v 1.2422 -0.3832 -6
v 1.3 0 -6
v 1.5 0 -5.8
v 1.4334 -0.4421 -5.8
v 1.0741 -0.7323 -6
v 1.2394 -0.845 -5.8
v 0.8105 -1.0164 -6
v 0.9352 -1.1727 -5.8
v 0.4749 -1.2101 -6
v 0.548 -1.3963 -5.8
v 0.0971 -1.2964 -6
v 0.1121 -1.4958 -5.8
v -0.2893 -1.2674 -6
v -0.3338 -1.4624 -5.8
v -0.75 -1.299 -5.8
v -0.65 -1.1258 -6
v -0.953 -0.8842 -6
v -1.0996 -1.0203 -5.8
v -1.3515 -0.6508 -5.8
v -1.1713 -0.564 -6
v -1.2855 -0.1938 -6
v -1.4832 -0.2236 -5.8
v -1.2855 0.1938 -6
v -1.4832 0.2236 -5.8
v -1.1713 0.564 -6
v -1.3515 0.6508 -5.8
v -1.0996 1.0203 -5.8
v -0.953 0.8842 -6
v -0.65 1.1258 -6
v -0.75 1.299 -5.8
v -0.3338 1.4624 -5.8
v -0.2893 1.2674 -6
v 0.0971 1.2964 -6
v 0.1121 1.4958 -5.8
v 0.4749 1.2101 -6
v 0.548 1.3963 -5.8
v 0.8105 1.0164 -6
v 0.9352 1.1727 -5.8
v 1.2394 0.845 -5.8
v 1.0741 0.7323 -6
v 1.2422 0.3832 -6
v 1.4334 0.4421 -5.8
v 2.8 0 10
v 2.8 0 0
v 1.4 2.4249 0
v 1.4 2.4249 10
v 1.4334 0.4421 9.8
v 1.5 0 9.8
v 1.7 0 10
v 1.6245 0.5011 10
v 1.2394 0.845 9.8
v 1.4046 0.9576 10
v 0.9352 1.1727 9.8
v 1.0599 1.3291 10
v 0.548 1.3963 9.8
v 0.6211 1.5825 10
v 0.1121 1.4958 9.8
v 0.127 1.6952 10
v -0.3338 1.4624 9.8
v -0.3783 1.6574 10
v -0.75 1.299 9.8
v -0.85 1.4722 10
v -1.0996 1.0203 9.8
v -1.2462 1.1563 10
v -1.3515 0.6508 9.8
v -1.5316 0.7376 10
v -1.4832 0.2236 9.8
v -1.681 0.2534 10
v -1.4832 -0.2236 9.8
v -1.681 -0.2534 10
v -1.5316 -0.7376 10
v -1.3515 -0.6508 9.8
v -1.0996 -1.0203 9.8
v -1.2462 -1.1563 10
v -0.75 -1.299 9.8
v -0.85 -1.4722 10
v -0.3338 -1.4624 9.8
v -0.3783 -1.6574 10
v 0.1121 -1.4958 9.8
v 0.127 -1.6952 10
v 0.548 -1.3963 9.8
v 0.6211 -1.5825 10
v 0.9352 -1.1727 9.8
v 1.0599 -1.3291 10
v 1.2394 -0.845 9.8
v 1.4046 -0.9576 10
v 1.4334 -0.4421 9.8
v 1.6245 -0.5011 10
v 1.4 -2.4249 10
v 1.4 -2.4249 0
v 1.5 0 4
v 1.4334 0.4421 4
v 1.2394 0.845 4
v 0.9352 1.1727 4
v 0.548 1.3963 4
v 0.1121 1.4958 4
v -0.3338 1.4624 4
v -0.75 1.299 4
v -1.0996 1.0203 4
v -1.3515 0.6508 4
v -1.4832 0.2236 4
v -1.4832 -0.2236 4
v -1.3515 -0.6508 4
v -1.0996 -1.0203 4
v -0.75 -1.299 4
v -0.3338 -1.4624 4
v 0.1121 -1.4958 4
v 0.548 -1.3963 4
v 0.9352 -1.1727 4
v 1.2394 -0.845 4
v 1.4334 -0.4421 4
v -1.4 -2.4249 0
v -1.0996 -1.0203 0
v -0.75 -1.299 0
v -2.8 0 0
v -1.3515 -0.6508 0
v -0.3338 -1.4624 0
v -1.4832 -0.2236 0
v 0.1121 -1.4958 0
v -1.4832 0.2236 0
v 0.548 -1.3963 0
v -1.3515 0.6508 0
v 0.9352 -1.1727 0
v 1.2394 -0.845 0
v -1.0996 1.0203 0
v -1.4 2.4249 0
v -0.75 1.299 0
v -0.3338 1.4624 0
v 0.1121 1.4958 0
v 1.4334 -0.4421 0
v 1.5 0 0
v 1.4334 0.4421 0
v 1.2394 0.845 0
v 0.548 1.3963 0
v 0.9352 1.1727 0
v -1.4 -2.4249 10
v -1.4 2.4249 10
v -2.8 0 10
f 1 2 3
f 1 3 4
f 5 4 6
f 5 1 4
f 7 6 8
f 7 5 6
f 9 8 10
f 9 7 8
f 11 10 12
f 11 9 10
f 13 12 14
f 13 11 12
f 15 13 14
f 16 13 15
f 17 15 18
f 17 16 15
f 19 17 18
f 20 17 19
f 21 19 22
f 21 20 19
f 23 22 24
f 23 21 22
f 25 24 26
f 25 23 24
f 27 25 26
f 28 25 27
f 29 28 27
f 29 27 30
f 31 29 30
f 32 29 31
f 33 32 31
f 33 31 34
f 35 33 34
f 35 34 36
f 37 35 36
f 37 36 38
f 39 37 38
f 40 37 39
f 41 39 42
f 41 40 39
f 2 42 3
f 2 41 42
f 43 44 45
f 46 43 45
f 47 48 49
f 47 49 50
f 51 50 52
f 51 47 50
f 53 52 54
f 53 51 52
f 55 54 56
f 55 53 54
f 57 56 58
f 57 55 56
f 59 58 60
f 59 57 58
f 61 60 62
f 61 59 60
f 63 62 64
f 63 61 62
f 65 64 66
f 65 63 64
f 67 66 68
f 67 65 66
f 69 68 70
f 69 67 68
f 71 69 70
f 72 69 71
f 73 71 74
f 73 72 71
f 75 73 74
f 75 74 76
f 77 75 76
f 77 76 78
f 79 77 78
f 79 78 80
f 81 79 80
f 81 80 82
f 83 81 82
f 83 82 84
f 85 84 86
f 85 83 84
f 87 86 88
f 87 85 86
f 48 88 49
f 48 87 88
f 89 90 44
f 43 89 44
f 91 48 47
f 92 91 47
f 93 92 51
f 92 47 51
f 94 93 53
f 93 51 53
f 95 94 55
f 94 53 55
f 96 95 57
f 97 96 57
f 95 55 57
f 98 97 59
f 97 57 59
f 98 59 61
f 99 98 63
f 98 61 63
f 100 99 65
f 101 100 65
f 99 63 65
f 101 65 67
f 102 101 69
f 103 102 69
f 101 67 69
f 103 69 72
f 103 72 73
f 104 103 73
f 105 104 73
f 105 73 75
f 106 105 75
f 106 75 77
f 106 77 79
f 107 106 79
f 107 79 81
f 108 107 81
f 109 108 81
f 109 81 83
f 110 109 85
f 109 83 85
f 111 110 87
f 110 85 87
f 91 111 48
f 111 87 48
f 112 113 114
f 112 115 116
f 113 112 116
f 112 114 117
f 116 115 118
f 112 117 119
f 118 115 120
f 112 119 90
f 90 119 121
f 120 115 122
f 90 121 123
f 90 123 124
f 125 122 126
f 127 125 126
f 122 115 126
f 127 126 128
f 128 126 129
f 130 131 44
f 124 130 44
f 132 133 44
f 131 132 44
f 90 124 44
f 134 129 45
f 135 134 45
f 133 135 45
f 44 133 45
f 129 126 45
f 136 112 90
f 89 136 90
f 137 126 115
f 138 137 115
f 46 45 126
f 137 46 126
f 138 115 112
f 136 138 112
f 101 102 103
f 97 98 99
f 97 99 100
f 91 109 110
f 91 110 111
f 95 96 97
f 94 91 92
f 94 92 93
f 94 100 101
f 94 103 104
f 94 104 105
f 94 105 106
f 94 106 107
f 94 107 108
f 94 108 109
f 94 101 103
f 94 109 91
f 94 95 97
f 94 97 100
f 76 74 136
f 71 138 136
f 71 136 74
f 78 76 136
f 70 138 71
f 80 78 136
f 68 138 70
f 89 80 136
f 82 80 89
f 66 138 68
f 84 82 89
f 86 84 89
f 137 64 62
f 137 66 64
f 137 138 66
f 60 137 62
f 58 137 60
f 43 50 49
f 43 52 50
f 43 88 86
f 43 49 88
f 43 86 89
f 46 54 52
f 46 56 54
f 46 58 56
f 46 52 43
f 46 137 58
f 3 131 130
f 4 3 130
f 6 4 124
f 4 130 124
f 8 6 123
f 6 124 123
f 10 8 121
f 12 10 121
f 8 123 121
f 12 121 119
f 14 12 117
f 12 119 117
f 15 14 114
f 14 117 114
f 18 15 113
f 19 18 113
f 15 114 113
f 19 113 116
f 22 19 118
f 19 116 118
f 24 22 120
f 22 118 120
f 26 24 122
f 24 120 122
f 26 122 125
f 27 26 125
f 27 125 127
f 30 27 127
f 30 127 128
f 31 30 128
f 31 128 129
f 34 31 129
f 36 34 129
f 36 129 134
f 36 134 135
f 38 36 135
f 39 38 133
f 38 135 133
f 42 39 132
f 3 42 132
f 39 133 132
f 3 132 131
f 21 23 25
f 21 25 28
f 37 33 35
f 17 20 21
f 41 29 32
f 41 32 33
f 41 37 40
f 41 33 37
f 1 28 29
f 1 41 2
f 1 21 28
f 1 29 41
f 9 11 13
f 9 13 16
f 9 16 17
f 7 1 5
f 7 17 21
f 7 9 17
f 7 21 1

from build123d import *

# Parameters (mm, degrees)
PAD_DEPTH    = 10
SKETCH001_R  = 1.5
PAD001_DEPTH = 6
SKETCH002_R  = 1.5
POCKET_DEPTH = 6
CHAMFER_SIZE = 0.2


with BuildPart() as part:
    # Sketch → Pad (new body)
    with BuildSketch(Plane.XY):
        Polygon((2.8, 0), (1.4, 2.424871), (-1.4, 2.424871), (-2.8, 0), (-1.4, -2.424871), (1.4, -2.424871), align=None)
    extrude(amount=PAD_DEPTH)

    # Sketch001 (on Face7 of Pad) → Pad001 (join)
    with BuildSketch(Plane(origin=(0, 0, 0), x_dir=(1, 0, 0), z_dir=(0, 0, -1))):
        Circle(SKETCH001_R)
    extrude(amount=PAD001_DEPTH)

    # Sketch002 (on Face5 of Pad001) → Pocket (cut)
    with BuildSketch(Plane.XY.offset(10)):
        Circle(SKETCH002_R)
    extrude(amount=-POCKET_DEPTH, mode=Mode.SUBTRACT)

    # Chamfer
    chamfer_edges = [part.edges().sort_by_distance(p)[0] for p in [
        (-1.5, 0, 10),
        (-1.5, 0, -6),
    ]]
    chamfer(chamfer_edges, length=CHAMFER_SIZE)


solid = part.part
